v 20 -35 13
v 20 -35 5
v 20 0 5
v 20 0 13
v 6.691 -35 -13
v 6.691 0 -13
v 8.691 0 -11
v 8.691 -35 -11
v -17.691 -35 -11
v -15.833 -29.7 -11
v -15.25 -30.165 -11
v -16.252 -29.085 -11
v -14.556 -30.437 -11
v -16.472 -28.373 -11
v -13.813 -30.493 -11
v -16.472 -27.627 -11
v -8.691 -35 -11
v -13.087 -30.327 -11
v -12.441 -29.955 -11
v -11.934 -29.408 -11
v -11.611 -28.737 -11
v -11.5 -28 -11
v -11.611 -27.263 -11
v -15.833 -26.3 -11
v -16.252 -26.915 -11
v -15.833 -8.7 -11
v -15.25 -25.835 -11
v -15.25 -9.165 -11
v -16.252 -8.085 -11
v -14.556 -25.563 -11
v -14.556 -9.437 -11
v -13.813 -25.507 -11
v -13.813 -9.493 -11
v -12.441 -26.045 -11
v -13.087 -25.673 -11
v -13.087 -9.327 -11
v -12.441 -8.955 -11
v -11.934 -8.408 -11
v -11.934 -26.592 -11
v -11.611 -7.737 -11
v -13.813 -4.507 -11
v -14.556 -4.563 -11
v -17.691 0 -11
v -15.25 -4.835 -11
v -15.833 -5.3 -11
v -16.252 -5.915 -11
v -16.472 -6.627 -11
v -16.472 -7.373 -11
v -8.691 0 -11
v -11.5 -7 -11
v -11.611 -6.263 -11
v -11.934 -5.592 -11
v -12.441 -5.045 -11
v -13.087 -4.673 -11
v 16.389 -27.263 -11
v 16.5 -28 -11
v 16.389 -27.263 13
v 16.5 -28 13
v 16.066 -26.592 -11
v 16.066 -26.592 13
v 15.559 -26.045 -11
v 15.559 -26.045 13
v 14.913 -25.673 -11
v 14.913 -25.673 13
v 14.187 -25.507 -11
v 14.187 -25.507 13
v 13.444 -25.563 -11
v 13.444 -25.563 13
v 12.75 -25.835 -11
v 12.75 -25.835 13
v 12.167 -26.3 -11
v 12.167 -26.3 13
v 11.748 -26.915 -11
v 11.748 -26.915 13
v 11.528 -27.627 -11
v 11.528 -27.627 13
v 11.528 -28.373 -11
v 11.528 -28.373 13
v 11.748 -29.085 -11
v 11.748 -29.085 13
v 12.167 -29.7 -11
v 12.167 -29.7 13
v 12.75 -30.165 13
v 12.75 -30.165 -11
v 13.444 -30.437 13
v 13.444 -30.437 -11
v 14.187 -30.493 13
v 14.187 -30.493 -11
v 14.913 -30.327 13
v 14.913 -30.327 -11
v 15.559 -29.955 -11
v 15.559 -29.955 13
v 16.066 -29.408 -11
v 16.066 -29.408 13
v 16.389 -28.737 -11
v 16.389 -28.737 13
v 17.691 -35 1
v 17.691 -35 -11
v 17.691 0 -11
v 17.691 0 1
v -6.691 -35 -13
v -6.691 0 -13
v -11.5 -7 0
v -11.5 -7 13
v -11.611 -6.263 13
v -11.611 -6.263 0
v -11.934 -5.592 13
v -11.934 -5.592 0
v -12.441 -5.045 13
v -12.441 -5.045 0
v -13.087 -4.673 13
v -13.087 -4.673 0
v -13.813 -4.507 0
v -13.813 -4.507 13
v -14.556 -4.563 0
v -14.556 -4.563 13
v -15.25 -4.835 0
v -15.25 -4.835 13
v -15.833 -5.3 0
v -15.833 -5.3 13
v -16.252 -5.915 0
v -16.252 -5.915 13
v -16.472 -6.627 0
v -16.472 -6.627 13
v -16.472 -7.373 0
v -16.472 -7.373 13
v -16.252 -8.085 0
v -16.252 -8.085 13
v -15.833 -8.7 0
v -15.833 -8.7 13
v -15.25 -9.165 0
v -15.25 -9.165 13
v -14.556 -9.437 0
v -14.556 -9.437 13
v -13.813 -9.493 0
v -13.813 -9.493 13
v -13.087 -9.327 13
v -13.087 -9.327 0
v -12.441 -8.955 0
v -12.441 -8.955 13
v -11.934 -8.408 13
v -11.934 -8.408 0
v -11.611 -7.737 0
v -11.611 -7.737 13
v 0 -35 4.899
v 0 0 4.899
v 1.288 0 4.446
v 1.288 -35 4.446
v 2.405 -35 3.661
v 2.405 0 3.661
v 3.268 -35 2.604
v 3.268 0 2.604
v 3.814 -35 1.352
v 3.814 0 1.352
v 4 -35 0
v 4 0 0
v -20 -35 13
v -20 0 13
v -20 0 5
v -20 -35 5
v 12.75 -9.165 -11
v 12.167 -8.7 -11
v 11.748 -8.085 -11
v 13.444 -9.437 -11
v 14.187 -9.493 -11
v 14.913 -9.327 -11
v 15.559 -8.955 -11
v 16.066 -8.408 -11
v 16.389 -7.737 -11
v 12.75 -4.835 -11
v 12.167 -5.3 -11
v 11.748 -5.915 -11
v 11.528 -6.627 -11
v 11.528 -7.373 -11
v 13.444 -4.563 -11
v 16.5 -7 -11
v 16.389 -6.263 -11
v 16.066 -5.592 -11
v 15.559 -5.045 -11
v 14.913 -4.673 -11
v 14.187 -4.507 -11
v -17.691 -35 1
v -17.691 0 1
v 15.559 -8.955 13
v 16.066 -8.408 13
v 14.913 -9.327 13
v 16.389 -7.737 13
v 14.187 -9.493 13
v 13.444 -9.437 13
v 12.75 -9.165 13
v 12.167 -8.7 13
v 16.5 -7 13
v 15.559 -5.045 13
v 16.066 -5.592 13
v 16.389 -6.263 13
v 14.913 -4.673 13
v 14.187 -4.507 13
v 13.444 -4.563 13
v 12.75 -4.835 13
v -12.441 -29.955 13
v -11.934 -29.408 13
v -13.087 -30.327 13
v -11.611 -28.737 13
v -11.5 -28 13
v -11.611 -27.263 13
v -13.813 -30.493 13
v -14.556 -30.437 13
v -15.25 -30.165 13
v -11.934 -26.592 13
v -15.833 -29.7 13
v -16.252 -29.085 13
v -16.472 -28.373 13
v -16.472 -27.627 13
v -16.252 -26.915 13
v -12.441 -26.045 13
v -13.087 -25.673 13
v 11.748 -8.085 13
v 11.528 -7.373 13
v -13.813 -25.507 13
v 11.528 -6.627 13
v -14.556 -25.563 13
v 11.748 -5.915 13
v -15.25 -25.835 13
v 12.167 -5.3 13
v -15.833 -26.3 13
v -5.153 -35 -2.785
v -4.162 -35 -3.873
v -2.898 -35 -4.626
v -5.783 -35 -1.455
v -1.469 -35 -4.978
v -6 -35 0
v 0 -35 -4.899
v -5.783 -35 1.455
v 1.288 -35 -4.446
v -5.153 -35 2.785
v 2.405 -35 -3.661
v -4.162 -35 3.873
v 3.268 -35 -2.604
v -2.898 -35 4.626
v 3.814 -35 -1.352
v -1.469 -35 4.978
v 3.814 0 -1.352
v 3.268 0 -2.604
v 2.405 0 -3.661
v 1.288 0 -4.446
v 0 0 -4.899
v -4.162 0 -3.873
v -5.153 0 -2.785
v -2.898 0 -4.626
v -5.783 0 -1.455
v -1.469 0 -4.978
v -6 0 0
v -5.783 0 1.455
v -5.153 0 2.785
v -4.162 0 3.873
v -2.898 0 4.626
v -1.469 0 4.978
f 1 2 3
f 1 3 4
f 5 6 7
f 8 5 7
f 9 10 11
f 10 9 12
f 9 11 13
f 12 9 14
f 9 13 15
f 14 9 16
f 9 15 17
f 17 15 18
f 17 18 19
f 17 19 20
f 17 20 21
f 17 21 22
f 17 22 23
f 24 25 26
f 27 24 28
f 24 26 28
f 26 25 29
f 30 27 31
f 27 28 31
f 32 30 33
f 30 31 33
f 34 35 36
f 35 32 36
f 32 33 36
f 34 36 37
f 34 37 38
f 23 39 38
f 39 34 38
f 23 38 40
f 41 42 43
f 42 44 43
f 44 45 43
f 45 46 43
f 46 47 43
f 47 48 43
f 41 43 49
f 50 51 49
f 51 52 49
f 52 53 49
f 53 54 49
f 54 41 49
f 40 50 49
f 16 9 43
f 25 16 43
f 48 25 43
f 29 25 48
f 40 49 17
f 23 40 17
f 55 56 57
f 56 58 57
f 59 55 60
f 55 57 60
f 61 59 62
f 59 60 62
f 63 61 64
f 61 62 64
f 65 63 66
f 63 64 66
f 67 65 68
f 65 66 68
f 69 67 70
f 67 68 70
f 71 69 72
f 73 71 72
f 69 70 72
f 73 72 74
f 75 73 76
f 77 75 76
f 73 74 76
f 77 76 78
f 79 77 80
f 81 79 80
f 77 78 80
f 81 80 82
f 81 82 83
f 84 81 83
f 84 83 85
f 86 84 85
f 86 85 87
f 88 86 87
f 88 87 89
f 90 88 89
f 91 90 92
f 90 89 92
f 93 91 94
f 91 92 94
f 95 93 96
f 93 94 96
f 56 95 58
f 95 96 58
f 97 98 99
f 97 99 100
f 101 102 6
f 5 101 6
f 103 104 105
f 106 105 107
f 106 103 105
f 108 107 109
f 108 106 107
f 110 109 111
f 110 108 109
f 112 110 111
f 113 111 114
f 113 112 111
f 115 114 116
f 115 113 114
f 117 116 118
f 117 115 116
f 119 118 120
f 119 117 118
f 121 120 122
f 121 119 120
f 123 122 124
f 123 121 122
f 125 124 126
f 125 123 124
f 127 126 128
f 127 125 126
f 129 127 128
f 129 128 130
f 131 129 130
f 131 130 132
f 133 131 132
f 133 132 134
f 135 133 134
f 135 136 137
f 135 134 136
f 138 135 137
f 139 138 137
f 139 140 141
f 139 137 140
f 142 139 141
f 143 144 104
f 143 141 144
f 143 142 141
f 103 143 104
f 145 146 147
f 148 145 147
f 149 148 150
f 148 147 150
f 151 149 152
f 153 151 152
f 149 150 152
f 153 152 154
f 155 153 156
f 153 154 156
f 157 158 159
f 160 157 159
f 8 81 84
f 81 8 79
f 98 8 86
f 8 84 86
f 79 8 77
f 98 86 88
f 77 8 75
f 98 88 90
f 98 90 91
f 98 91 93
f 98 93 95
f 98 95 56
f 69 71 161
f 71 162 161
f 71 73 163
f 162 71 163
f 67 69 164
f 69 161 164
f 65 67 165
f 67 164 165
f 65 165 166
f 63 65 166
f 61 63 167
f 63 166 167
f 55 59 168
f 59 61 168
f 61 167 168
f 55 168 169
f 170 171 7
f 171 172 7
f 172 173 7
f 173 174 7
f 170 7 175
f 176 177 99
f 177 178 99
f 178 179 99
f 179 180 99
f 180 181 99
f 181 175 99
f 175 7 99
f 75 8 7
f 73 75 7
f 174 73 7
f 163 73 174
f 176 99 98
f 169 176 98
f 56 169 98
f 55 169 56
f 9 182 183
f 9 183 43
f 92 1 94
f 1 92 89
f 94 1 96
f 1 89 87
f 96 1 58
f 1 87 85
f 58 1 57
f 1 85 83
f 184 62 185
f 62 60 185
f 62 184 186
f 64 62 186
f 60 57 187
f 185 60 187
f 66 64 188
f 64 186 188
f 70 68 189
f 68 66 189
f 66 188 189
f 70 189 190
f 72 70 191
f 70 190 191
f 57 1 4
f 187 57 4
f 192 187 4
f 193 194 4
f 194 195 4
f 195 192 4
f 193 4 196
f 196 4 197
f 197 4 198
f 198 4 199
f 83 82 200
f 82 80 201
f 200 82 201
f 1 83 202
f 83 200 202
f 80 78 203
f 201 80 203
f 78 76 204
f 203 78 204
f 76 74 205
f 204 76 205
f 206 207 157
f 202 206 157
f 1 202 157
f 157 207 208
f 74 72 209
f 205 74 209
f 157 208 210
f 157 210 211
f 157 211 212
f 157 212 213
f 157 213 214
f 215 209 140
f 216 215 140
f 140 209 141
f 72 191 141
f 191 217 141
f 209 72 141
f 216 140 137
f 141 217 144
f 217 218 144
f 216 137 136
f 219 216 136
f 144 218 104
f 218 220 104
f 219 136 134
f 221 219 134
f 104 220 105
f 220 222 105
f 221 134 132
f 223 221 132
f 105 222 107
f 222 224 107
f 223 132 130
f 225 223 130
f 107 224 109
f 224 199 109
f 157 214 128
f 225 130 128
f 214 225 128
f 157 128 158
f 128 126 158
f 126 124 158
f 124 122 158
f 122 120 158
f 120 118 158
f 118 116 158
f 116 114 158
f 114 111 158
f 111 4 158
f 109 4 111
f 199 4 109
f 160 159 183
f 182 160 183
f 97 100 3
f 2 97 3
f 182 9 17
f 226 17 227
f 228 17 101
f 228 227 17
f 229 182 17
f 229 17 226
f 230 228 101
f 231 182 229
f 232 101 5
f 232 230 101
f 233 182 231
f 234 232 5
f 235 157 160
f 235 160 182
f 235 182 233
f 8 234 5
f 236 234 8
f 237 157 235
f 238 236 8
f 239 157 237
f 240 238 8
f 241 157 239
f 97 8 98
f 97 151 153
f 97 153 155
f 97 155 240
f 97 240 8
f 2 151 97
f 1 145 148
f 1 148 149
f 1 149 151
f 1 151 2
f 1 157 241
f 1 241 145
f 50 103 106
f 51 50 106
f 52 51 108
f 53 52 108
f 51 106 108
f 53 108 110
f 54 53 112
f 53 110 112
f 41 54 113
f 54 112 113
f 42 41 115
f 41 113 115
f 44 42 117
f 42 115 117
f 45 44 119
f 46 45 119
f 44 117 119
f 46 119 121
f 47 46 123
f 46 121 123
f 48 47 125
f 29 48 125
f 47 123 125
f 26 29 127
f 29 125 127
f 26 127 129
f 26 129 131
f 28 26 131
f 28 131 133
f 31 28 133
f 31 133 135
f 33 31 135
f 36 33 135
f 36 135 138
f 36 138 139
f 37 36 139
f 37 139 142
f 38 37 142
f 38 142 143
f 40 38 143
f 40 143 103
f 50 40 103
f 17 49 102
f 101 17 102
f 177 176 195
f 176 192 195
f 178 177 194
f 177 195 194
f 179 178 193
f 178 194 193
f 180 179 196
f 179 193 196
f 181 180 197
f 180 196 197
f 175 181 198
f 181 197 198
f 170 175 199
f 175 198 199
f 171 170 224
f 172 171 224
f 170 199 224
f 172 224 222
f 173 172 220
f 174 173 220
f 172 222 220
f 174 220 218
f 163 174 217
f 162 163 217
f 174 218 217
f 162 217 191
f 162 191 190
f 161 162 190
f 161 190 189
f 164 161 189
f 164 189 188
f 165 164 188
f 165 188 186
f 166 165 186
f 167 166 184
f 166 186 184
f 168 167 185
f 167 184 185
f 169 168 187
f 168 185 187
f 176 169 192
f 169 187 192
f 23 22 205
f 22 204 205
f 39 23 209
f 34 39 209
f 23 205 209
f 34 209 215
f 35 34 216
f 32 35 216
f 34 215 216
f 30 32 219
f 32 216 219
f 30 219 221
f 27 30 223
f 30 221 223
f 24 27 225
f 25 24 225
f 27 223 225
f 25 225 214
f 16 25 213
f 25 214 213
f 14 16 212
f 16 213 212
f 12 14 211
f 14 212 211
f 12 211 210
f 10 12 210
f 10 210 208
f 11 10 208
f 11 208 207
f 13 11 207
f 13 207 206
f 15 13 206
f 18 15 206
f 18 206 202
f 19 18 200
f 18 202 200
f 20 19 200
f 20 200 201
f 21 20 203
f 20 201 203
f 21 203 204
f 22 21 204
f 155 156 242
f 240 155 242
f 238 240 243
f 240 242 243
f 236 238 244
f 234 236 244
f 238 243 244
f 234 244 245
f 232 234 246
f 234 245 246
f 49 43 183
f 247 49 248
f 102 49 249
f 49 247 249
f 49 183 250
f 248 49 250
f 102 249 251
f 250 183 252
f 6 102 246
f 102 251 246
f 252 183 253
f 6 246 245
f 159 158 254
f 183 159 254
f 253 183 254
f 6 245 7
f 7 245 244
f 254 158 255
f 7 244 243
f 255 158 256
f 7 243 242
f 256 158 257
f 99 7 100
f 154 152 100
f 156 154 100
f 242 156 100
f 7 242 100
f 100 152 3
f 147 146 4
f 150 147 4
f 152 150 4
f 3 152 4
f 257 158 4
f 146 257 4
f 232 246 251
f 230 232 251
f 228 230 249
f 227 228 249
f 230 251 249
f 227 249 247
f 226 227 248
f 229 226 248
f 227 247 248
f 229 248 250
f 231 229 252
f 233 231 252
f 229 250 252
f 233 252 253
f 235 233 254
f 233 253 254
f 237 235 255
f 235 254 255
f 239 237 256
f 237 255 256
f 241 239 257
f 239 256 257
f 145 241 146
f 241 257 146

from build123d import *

# Parameters (mm, degrees)
F1_DEPTH = 35
F2_R     = 2.5
F3_DEPTH = 25.4


with BuildPart() as f1:
    # F0 (on Front) → F1 (new body)
    with BuildSketch(Plane.XZ):
        with BuildLine():
            Line((0, -13), (6.690599, -13))
            Line((6.690599, -13), (8.690599, -11))
            Line((8.690599, -11), (17.690599, -11))
            Line((17.690599, -11), (17.690599, 1))
            Line((17.690599, 1), (20, 5))
            Line((20, 5), (20, 13))
            Line((20, 13), (0, 13))
            Line((0, 13), (0, 4.898979))
            ThreePointArc((0, 4.898979), (2.872983, 3.162278), (4, 0))
            ThreePointArc((4, 0), (2.872983, -3.162278), (0, -4.898979))
            Line((0, -4.898979), (0, -13))
        make_face()
        with BuildLine():
            Line((-6.690599, -13), (0, -13))
            Line((0, -13), (0, -4.898979))
            ThreePointArc((0, -4.898979), (-6, 0), (0, 4.898979))
            Line((0, 4.898979), (0, 13))
            Line((0, 13), (-20, 13))
            Line((-20, 13), (-20, 5))
            Line((-20, 5), (-17.690599, 1))
            Line((-17.690599, 1), (-17.690599, -11))
            Line((-17.690599, -11), (-8.690599, -11))
            Line((-8.690599, -11), (-6.690599, -13))
        make_face()
    extrude(amount=F1_DEPTH)

    # F2 (on Top) → F3 (cut, symmetric)
    with BuildSketch(Plane.XY):
        with Locations((14, -28)):
            Circle(F2_R)
        with Locations((14, -7)):
            Circle(F2_R)
        with Locations((-14, -7)):
            Circle(F2_R)
        with Locations((-14, -28)):
            Circle(F2_R)
    extrude(amount=F3_DEPTH, both=True, mode=Mode.SUBTRACT)


solid = f1.part
